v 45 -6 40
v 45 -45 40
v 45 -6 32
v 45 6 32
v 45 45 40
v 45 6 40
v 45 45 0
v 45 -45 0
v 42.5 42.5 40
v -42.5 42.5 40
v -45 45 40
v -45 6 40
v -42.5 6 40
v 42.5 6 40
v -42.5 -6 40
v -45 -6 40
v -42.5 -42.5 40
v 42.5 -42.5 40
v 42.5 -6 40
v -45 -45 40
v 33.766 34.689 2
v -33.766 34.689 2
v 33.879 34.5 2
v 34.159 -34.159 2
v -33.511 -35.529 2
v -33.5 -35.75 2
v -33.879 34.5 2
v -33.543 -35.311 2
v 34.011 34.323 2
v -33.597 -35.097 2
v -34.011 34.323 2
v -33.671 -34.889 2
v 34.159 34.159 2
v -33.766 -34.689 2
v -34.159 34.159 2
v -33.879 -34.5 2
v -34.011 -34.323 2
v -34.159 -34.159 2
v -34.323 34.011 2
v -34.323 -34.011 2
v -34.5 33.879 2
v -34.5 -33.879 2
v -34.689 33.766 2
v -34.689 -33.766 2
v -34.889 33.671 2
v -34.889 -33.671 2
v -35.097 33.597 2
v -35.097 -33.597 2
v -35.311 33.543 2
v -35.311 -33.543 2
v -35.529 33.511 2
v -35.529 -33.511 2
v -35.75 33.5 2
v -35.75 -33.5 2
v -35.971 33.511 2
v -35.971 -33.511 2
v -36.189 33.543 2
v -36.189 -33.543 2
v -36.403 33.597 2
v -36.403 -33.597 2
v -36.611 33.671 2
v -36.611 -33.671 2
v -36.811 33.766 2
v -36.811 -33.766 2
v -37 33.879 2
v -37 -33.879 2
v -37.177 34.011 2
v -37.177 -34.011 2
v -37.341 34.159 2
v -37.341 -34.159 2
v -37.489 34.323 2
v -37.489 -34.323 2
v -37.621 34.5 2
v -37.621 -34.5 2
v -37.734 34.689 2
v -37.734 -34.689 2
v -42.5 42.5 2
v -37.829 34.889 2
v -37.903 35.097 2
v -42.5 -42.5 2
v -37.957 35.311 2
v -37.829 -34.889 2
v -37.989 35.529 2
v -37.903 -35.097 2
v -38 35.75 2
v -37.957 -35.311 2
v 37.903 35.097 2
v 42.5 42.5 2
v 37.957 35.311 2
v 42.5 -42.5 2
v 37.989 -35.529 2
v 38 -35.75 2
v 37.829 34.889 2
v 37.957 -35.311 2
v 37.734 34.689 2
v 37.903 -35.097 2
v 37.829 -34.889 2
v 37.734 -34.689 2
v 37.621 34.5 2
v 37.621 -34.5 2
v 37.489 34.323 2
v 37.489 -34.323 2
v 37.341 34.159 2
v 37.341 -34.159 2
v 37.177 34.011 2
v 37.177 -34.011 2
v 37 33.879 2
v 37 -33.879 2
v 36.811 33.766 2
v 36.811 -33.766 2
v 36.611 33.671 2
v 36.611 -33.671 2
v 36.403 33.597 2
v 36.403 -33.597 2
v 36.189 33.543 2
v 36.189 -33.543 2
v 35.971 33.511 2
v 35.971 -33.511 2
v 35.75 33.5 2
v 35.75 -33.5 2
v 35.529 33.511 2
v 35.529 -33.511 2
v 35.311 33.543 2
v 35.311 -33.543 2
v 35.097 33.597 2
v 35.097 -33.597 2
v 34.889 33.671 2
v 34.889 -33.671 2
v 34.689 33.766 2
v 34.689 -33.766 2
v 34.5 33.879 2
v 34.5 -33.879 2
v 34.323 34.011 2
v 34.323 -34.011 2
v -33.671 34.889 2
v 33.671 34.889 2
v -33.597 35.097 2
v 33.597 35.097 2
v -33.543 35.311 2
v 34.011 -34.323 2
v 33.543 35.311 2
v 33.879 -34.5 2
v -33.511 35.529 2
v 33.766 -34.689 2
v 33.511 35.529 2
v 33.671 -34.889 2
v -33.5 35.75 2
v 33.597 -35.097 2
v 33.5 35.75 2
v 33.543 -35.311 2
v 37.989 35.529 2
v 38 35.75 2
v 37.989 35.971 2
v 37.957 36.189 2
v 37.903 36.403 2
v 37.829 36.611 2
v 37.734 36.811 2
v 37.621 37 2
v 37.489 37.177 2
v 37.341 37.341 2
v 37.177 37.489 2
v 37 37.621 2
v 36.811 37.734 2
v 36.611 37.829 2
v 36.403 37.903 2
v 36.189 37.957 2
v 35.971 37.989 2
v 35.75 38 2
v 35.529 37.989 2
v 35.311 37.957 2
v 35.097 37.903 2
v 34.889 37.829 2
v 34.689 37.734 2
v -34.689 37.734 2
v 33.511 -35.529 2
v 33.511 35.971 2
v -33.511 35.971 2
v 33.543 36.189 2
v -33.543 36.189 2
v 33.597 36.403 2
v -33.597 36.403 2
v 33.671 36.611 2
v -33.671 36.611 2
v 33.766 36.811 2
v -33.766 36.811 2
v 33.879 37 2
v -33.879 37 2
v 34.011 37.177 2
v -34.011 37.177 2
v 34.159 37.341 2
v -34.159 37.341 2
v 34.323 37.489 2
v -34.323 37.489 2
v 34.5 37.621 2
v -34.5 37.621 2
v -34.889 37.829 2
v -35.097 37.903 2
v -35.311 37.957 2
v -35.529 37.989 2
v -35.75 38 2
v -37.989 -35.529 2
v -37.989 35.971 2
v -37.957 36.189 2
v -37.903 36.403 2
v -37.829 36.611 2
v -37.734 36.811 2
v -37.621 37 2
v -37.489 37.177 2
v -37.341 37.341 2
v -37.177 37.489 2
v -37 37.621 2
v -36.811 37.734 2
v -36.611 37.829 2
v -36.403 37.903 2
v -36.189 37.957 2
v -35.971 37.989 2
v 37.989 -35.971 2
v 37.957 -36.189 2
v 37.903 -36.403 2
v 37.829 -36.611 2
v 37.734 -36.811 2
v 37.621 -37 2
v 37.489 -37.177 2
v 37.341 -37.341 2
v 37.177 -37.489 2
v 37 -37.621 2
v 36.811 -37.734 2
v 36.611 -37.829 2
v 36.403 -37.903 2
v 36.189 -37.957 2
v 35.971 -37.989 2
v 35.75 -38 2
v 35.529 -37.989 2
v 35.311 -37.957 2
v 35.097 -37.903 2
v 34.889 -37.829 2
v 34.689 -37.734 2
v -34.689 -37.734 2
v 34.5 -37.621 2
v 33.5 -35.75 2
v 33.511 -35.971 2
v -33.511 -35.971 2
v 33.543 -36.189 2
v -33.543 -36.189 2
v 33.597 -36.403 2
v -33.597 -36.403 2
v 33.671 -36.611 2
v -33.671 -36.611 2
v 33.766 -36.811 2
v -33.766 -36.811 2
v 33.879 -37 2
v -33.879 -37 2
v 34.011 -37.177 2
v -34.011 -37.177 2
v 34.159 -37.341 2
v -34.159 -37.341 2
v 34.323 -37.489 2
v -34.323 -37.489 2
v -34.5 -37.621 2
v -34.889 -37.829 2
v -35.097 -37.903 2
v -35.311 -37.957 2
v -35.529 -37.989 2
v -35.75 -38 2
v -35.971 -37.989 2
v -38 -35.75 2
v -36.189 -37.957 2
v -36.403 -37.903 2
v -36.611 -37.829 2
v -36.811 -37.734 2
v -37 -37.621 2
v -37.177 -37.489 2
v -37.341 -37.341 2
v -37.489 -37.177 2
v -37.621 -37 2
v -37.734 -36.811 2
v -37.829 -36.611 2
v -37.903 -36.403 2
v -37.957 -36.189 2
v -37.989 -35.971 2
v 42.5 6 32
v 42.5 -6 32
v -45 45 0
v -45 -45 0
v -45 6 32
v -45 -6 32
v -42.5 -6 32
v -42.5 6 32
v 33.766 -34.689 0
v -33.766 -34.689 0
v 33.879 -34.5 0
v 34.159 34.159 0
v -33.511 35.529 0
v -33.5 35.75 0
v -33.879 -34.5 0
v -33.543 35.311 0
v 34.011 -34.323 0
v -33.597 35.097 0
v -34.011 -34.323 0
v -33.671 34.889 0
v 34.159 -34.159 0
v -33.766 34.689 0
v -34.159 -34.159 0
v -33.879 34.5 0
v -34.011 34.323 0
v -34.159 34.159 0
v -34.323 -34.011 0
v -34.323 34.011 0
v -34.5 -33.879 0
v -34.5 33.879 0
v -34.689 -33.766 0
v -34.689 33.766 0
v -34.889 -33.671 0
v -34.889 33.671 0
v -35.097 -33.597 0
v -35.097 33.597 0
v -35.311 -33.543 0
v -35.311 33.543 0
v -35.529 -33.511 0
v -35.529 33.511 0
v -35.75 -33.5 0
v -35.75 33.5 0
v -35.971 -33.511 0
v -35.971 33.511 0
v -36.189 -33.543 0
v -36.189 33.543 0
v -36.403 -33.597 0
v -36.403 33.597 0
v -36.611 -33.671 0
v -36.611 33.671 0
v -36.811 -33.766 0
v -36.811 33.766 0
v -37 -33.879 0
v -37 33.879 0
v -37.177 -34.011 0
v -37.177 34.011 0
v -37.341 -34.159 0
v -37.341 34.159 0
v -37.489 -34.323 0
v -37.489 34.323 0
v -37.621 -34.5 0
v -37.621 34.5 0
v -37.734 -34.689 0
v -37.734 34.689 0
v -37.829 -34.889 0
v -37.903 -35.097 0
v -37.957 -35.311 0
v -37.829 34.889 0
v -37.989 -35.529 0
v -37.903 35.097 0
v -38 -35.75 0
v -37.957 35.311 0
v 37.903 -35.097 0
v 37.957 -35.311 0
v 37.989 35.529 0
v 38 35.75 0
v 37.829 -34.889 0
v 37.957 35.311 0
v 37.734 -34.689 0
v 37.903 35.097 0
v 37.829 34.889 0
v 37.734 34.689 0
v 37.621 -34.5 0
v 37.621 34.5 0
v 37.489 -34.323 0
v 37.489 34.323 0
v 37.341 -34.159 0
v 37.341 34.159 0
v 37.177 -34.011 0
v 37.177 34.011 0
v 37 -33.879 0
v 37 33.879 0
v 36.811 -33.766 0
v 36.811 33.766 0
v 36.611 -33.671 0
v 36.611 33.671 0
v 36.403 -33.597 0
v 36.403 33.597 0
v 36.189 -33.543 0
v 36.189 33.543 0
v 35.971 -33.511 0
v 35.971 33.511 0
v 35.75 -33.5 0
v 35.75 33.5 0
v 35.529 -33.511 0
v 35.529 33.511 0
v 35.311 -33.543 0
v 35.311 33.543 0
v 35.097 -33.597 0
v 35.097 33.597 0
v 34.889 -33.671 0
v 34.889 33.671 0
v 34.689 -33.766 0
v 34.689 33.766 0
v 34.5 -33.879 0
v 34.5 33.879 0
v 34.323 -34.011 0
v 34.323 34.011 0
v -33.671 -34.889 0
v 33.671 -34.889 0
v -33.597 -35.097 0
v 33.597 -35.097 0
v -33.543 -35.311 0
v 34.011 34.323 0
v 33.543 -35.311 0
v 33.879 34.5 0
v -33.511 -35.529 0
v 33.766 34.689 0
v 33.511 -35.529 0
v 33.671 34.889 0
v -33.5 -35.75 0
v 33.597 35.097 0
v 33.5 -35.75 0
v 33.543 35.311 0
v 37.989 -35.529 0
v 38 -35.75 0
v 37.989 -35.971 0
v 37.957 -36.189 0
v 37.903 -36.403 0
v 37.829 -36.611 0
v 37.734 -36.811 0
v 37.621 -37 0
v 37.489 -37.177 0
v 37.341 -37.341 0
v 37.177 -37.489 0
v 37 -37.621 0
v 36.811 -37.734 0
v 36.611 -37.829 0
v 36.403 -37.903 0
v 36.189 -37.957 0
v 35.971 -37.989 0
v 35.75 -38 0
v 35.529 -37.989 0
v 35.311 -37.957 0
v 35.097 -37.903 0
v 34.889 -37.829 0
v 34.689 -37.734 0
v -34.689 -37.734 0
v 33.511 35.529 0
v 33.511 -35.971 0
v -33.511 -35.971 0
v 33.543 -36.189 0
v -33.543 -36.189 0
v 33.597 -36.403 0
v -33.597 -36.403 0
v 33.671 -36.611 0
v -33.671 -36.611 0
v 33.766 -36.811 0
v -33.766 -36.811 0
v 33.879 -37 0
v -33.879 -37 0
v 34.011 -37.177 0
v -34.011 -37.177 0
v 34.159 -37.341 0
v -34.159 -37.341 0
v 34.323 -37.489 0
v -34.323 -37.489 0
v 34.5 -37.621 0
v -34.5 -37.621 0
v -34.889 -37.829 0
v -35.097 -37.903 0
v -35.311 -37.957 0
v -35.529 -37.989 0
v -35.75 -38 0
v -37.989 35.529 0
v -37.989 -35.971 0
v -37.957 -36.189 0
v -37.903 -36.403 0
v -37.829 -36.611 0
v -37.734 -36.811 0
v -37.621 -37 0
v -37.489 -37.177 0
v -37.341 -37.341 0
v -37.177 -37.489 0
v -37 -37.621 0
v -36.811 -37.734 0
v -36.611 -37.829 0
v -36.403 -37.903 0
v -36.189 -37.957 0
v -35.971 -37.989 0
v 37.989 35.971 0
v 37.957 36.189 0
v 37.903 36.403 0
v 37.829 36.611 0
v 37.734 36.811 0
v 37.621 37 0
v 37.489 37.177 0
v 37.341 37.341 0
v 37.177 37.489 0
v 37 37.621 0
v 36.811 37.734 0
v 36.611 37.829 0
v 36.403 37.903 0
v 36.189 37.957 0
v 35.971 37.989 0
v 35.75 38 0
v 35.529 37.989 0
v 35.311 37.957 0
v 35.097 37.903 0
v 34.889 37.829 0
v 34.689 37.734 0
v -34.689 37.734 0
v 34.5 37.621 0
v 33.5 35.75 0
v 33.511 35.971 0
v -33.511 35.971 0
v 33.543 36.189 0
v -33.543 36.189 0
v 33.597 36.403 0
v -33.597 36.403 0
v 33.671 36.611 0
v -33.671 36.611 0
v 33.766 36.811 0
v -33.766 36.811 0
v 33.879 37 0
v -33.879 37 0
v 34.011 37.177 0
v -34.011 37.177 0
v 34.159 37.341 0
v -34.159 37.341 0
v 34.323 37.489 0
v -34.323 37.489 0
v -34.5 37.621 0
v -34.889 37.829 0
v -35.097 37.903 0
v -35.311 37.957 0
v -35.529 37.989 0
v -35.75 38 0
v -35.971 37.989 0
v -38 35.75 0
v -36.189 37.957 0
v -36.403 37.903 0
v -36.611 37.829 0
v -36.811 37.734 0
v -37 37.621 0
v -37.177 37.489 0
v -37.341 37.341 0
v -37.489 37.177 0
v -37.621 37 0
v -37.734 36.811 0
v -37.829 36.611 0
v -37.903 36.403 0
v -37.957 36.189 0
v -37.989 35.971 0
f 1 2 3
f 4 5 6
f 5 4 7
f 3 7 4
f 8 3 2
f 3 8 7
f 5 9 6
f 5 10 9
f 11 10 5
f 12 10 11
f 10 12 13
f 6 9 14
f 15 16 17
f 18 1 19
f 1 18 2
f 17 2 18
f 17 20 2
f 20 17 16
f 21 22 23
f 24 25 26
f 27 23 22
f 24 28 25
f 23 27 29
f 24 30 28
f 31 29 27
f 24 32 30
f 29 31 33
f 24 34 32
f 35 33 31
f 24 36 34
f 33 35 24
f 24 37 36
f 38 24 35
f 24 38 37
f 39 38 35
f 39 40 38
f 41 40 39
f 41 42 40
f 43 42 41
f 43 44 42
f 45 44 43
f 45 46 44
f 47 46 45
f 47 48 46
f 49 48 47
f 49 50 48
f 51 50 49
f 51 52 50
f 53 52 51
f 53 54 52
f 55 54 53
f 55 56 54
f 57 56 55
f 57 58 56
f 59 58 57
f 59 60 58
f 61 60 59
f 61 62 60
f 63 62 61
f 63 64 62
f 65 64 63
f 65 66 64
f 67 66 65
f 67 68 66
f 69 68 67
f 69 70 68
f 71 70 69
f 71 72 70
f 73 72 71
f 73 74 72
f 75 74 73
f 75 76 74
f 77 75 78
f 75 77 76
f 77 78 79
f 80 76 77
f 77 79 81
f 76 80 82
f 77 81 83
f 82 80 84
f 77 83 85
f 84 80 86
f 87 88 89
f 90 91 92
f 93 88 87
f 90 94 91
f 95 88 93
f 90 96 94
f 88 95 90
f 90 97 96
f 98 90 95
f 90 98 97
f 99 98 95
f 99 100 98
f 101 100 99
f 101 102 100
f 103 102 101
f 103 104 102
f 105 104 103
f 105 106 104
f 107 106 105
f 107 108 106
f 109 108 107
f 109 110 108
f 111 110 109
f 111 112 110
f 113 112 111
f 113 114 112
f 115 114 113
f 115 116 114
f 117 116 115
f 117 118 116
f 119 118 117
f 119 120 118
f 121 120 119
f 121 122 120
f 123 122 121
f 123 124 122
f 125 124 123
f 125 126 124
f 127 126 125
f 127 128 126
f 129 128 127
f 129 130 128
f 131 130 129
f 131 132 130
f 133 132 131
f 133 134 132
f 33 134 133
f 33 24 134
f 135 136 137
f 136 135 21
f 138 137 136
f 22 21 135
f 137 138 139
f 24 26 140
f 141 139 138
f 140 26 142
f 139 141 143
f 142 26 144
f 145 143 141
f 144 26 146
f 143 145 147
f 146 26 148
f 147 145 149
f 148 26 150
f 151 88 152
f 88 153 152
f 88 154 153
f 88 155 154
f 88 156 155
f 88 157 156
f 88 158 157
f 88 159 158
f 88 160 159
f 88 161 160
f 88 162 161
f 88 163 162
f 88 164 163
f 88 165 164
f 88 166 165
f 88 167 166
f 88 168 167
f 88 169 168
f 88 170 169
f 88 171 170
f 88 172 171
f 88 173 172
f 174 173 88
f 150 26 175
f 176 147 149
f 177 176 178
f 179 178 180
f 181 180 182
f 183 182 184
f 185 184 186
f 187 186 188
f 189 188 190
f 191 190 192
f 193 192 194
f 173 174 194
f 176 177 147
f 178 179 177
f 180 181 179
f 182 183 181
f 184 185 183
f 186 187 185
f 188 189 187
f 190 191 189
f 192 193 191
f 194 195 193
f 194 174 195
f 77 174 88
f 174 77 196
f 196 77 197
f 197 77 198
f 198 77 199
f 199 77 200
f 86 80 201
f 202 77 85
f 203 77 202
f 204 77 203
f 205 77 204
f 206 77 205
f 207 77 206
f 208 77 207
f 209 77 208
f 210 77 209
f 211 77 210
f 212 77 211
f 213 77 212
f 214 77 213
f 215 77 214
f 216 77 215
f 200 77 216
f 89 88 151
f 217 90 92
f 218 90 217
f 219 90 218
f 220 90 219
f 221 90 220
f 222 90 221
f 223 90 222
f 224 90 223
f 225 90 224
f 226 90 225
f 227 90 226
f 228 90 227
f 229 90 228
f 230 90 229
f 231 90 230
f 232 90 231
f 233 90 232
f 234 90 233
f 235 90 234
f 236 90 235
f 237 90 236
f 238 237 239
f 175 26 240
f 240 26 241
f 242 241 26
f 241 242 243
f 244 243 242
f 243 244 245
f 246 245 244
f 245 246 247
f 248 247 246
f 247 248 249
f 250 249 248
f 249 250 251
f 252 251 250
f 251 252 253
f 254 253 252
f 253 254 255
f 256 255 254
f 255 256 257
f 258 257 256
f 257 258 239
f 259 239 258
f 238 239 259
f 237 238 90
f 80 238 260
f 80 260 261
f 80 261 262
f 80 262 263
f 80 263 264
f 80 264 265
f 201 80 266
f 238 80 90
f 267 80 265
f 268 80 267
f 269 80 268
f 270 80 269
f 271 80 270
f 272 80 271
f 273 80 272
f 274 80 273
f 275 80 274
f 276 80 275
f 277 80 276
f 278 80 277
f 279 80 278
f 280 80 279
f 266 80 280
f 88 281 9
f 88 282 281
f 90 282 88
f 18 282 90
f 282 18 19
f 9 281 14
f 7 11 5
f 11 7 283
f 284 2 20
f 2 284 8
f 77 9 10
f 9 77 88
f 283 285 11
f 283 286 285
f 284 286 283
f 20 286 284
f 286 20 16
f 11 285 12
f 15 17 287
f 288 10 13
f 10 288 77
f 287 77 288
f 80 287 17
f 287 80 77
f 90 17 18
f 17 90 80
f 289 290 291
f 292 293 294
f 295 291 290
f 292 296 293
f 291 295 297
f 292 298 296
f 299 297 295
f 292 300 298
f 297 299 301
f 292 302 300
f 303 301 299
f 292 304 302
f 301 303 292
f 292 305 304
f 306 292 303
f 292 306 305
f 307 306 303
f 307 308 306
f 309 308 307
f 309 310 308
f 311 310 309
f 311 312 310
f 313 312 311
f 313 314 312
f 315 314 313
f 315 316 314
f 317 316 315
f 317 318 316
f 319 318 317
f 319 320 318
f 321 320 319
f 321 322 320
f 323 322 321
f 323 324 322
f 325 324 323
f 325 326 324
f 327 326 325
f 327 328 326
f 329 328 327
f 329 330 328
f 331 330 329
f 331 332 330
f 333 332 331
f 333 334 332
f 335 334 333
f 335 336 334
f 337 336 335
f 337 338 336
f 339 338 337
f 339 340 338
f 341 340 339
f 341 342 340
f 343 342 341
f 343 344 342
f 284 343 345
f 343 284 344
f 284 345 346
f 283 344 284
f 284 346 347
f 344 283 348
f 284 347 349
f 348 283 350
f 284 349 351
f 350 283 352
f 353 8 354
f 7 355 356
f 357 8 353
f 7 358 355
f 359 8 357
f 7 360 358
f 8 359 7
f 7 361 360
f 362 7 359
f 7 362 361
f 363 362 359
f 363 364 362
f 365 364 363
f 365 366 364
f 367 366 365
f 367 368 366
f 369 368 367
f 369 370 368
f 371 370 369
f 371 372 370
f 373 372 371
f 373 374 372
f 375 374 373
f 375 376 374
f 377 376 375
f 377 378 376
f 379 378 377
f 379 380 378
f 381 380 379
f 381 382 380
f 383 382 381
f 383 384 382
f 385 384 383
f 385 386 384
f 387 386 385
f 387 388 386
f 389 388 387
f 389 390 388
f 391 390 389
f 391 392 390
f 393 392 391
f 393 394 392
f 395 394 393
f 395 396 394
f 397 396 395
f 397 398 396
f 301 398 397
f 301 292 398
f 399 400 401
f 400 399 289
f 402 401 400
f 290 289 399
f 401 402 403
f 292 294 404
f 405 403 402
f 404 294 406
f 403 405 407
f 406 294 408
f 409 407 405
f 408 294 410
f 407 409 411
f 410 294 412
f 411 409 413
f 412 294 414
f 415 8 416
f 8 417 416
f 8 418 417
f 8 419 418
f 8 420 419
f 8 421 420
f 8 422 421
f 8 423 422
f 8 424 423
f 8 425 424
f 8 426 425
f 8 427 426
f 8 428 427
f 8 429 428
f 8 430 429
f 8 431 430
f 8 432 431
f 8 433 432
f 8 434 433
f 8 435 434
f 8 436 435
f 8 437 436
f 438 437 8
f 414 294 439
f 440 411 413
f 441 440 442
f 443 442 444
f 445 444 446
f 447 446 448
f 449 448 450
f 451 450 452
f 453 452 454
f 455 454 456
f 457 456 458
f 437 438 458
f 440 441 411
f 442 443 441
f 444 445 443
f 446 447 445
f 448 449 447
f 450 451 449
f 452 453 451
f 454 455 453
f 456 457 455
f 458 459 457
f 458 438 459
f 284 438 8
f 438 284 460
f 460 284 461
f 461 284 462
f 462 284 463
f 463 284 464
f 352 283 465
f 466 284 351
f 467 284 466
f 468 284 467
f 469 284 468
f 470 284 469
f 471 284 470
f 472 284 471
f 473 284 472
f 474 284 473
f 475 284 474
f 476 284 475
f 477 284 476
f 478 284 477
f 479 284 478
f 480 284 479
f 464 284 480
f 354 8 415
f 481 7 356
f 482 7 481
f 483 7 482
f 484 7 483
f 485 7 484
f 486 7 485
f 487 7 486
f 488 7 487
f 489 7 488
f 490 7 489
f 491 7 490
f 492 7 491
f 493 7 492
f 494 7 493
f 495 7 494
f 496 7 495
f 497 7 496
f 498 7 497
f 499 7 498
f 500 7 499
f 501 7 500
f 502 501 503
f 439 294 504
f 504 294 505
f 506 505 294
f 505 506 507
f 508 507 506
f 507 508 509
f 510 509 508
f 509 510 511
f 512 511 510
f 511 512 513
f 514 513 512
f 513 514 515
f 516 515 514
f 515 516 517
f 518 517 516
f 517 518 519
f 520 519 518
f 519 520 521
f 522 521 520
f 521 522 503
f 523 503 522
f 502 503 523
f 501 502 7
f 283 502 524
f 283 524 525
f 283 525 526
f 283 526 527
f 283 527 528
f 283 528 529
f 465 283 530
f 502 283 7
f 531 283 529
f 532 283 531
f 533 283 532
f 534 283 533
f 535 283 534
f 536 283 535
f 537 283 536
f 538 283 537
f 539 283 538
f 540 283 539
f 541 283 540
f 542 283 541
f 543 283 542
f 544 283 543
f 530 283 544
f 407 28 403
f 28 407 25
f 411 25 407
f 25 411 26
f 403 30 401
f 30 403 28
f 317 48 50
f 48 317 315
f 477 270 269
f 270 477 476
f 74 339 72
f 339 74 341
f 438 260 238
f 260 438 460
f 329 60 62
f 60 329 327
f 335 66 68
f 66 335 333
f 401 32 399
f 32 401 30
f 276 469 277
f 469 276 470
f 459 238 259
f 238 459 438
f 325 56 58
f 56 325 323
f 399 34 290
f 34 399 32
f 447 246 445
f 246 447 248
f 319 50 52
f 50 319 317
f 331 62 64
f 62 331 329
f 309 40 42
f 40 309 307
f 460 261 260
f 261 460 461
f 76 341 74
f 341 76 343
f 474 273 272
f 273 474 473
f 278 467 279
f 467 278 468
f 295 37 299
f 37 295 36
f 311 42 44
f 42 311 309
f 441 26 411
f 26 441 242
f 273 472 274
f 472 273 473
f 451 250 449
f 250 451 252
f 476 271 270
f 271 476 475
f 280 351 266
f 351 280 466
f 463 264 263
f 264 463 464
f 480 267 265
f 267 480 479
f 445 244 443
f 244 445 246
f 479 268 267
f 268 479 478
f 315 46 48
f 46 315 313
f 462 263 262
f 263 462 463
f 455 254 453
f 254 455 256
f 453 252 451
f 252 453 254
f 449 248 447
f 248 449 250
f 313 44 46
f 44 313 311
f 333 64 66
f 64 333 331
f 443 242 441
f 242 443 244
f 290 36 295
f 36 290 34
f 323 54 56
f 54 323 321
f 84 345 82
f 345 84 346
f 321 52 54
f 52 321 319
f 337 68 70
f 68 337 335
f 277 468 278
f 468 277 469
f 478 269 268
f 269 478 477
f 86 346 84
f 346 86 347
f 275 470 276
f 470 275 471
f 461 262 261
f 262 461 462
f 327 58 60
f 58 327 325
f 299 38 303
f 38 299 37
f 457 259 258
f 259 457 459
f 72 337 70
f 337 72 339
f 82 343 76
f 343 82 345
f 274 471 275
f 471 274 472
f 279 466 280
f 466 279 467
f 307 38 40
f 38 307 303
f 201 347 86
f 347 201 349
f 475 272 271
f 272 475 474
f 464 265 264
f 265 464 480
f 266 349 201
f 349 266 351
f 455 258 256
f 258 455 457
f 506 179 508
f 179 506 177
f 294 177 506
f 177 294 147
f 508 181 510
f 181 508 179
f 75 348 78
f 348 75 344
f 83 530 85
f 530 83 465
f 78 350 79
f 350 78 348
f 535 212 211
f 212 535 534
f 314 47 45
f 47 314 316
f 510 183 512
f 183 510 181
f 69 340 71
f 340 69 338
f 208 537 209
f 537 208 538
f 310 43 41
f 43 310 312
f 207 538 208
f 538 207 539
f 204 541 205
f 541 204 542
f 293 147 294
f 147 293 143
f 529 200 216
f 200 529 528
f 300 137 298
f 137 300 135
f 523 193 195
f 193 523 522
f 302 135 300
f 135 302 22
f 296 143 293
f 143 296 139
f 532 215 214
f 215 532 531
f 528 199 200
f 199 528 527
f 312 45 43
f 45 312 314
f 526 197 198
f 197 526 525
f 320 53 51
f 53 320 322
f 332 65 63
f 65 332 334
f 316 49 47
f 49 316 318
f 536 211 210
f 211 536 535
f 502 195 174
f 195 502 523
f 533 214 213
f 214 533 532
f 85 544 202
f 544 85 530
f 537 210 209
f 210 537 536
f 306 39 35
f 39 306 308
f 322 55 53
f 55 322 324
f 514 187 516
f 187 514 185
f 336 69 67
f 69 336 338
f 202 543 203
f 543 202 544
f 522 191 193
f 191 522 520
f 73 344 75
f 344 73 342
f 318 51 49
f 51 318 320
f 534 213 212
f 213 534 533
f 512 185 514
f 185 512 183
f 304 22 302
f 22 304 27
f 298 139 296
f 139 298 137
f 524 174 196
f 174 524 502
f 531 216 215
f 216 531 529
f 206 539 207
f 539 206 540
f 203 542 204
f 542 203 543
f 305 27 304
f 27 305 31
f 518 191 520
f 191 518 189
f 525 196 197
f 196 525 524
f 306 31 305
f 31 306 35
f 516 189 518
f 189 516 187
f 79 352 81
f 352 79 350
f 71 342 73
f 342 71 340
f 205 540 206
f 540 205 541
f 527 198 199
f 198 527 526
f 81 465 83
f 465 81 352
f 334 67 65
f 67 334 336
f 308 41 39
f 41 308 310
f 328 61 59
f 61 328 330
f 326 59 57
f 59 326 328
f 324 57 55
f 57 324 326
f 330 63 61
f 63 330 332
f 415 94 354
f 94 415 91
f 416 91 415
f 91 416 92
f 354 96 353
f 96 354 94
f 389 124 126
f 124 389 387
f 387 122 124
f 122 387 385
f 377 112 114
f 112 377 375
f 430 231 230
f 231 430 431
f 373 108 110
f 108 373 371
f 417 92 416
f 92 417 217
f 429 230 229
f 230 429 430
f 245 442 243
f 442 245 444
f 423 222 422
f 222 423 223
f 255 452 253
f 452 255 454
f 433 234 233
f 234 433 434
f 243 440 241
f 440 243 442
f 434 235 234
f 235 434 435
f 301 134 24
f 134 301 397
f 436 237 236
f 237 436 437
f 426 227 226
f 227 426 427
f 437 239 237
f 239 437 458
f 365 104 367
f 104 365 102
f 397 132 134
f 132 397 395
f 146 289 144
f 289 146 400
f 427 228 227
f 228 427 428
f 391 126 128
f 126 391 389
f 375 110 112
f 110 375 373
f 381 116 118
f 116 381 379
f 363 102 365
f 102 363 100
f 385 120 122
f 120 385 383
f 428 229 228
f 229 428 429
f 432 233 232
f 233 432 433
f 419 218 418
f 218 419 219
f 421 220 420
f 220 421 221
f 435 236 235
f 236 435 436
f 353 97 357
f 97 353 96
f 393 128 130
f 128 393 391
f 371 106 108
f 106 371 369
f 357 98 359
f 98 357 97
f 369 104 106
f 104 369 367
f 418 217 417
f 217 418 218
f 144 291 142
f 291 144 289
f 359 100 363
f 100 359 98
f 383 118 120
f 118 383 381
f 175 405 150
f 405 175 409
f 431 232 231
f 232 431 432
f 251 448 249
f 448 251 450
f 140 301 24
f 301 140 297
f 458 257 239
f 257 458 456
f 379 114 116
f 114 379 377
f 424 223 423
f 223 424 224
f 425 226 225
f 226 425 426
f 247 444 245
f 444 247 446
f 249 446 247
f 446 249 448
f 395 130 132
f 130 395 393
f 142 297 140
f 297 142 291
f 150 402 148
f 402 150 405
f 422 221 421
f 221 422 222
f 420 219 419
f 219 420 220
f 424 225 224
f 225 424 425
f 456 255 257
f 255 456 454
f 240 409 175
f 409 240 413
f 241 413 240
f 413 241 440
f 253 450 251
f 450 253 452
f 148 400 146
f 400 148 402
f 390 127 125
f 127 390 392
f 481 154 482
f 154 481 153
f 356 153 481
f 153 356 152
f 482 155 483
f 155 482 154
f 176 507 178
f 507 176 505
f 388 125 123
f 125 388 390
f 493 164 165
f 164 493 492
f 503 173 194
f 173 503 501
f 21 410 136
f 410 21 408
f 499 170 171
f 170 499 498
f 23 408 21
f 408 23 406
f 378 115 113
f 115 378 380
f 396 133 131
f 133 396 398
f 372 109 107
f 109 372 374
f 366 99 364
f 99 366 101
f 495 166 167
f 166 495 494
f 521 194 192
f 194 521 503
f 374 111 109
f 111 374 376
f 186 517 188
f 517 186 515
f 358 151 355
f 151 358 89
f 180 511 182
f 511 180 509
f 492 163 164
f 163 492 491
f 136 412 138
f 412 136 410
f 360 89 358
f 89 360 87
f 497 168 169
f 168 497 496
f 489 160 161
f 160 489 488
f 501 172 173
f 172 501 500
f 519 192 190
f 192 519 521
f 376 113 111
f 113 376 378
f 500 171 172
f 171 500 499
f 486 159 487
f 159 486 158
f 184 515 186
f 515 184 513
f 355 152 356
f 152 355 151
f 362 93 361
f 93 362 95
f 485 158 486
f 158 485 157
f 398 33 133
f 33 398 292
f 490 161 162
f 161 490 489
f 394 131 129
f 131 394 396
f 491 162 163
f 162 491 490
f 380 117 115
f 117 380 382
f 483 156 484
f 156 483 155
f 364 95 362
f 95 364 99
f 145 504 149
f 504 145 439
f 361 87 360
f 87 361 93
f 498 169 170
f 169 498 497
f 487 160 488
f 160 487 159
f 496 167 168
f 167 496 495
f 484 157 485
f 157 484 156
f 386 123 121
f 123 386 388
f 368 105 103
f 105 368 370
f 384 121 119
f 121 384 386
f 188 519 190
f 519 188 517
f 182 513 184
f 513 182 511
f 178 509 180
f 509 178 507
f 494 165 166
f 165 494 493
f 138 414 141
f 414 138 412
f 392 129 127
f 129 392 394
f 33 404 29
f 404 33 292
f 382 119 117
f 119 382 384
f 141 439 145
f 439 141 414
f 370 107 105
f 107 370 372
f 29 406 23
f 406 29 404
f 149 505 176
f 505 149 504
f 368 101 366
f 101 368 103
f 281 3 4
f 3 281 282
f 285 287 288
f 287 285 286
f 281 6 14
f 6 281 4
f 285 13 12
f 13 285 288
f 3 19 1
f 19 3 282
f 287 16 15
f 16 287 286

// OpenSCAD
// Magnetic stirrer housing for 80 mm PC case fan
// Print orientation: top plate on bed (z = 0), walls rise to open top (z = 40)

// ---------- Parameters ----------
plate_t      = 2;     // top plate thickness
wall_t       = 2.5;   // wall thickness
open_top_z   = 40;    // height of open top
outer_size   = 90;    // outer X/Y size of box
screw_hole   = 4.5;   // M4 screw hole diameter
screw_pitch  = 71.5;  // square pattern size for screw holes
cable_notch  = 12;    // cable notch width
cable_depth  = 8;     // cable notch depth from open edge
eps          = 0.5;   // cutter overshoot past faces

$fn = 64;

// ---------- Model ----------
difference() {
    // Box body
    union() {
        // Top plate
        translate([-outer_size/2, -outer_size/2, 0])
            cube([outer_size, outer_size, plate_t]);
        // Walls
        for (a = [0, 90, 180, 270])
            rotate([0, 0, a])
                translate([outer_size/2 - wall_t, -outer_size/2, plate_t])
                    cube([wall_t, outer_size, open_top_z - plate_t]);
    }

    // Screw holes through top plate
    for (x = [-screw_pitch/2, screw_pitch/2])
        for (y = [-screw_pitch/2, screw_pitch/2])
            translate([x, y, -eps])
                cylinder(d = screw_hole, h = plate_t + 2*eps);

    // Cable notch in one wall (centred along Y, from z = 32 to z = 40)
    translate([-outer_size/2, -cable_notch/2, open_top_z - cable_depth])
        cube([outer_size, cable_notch, cable_depth + eps]);
}
